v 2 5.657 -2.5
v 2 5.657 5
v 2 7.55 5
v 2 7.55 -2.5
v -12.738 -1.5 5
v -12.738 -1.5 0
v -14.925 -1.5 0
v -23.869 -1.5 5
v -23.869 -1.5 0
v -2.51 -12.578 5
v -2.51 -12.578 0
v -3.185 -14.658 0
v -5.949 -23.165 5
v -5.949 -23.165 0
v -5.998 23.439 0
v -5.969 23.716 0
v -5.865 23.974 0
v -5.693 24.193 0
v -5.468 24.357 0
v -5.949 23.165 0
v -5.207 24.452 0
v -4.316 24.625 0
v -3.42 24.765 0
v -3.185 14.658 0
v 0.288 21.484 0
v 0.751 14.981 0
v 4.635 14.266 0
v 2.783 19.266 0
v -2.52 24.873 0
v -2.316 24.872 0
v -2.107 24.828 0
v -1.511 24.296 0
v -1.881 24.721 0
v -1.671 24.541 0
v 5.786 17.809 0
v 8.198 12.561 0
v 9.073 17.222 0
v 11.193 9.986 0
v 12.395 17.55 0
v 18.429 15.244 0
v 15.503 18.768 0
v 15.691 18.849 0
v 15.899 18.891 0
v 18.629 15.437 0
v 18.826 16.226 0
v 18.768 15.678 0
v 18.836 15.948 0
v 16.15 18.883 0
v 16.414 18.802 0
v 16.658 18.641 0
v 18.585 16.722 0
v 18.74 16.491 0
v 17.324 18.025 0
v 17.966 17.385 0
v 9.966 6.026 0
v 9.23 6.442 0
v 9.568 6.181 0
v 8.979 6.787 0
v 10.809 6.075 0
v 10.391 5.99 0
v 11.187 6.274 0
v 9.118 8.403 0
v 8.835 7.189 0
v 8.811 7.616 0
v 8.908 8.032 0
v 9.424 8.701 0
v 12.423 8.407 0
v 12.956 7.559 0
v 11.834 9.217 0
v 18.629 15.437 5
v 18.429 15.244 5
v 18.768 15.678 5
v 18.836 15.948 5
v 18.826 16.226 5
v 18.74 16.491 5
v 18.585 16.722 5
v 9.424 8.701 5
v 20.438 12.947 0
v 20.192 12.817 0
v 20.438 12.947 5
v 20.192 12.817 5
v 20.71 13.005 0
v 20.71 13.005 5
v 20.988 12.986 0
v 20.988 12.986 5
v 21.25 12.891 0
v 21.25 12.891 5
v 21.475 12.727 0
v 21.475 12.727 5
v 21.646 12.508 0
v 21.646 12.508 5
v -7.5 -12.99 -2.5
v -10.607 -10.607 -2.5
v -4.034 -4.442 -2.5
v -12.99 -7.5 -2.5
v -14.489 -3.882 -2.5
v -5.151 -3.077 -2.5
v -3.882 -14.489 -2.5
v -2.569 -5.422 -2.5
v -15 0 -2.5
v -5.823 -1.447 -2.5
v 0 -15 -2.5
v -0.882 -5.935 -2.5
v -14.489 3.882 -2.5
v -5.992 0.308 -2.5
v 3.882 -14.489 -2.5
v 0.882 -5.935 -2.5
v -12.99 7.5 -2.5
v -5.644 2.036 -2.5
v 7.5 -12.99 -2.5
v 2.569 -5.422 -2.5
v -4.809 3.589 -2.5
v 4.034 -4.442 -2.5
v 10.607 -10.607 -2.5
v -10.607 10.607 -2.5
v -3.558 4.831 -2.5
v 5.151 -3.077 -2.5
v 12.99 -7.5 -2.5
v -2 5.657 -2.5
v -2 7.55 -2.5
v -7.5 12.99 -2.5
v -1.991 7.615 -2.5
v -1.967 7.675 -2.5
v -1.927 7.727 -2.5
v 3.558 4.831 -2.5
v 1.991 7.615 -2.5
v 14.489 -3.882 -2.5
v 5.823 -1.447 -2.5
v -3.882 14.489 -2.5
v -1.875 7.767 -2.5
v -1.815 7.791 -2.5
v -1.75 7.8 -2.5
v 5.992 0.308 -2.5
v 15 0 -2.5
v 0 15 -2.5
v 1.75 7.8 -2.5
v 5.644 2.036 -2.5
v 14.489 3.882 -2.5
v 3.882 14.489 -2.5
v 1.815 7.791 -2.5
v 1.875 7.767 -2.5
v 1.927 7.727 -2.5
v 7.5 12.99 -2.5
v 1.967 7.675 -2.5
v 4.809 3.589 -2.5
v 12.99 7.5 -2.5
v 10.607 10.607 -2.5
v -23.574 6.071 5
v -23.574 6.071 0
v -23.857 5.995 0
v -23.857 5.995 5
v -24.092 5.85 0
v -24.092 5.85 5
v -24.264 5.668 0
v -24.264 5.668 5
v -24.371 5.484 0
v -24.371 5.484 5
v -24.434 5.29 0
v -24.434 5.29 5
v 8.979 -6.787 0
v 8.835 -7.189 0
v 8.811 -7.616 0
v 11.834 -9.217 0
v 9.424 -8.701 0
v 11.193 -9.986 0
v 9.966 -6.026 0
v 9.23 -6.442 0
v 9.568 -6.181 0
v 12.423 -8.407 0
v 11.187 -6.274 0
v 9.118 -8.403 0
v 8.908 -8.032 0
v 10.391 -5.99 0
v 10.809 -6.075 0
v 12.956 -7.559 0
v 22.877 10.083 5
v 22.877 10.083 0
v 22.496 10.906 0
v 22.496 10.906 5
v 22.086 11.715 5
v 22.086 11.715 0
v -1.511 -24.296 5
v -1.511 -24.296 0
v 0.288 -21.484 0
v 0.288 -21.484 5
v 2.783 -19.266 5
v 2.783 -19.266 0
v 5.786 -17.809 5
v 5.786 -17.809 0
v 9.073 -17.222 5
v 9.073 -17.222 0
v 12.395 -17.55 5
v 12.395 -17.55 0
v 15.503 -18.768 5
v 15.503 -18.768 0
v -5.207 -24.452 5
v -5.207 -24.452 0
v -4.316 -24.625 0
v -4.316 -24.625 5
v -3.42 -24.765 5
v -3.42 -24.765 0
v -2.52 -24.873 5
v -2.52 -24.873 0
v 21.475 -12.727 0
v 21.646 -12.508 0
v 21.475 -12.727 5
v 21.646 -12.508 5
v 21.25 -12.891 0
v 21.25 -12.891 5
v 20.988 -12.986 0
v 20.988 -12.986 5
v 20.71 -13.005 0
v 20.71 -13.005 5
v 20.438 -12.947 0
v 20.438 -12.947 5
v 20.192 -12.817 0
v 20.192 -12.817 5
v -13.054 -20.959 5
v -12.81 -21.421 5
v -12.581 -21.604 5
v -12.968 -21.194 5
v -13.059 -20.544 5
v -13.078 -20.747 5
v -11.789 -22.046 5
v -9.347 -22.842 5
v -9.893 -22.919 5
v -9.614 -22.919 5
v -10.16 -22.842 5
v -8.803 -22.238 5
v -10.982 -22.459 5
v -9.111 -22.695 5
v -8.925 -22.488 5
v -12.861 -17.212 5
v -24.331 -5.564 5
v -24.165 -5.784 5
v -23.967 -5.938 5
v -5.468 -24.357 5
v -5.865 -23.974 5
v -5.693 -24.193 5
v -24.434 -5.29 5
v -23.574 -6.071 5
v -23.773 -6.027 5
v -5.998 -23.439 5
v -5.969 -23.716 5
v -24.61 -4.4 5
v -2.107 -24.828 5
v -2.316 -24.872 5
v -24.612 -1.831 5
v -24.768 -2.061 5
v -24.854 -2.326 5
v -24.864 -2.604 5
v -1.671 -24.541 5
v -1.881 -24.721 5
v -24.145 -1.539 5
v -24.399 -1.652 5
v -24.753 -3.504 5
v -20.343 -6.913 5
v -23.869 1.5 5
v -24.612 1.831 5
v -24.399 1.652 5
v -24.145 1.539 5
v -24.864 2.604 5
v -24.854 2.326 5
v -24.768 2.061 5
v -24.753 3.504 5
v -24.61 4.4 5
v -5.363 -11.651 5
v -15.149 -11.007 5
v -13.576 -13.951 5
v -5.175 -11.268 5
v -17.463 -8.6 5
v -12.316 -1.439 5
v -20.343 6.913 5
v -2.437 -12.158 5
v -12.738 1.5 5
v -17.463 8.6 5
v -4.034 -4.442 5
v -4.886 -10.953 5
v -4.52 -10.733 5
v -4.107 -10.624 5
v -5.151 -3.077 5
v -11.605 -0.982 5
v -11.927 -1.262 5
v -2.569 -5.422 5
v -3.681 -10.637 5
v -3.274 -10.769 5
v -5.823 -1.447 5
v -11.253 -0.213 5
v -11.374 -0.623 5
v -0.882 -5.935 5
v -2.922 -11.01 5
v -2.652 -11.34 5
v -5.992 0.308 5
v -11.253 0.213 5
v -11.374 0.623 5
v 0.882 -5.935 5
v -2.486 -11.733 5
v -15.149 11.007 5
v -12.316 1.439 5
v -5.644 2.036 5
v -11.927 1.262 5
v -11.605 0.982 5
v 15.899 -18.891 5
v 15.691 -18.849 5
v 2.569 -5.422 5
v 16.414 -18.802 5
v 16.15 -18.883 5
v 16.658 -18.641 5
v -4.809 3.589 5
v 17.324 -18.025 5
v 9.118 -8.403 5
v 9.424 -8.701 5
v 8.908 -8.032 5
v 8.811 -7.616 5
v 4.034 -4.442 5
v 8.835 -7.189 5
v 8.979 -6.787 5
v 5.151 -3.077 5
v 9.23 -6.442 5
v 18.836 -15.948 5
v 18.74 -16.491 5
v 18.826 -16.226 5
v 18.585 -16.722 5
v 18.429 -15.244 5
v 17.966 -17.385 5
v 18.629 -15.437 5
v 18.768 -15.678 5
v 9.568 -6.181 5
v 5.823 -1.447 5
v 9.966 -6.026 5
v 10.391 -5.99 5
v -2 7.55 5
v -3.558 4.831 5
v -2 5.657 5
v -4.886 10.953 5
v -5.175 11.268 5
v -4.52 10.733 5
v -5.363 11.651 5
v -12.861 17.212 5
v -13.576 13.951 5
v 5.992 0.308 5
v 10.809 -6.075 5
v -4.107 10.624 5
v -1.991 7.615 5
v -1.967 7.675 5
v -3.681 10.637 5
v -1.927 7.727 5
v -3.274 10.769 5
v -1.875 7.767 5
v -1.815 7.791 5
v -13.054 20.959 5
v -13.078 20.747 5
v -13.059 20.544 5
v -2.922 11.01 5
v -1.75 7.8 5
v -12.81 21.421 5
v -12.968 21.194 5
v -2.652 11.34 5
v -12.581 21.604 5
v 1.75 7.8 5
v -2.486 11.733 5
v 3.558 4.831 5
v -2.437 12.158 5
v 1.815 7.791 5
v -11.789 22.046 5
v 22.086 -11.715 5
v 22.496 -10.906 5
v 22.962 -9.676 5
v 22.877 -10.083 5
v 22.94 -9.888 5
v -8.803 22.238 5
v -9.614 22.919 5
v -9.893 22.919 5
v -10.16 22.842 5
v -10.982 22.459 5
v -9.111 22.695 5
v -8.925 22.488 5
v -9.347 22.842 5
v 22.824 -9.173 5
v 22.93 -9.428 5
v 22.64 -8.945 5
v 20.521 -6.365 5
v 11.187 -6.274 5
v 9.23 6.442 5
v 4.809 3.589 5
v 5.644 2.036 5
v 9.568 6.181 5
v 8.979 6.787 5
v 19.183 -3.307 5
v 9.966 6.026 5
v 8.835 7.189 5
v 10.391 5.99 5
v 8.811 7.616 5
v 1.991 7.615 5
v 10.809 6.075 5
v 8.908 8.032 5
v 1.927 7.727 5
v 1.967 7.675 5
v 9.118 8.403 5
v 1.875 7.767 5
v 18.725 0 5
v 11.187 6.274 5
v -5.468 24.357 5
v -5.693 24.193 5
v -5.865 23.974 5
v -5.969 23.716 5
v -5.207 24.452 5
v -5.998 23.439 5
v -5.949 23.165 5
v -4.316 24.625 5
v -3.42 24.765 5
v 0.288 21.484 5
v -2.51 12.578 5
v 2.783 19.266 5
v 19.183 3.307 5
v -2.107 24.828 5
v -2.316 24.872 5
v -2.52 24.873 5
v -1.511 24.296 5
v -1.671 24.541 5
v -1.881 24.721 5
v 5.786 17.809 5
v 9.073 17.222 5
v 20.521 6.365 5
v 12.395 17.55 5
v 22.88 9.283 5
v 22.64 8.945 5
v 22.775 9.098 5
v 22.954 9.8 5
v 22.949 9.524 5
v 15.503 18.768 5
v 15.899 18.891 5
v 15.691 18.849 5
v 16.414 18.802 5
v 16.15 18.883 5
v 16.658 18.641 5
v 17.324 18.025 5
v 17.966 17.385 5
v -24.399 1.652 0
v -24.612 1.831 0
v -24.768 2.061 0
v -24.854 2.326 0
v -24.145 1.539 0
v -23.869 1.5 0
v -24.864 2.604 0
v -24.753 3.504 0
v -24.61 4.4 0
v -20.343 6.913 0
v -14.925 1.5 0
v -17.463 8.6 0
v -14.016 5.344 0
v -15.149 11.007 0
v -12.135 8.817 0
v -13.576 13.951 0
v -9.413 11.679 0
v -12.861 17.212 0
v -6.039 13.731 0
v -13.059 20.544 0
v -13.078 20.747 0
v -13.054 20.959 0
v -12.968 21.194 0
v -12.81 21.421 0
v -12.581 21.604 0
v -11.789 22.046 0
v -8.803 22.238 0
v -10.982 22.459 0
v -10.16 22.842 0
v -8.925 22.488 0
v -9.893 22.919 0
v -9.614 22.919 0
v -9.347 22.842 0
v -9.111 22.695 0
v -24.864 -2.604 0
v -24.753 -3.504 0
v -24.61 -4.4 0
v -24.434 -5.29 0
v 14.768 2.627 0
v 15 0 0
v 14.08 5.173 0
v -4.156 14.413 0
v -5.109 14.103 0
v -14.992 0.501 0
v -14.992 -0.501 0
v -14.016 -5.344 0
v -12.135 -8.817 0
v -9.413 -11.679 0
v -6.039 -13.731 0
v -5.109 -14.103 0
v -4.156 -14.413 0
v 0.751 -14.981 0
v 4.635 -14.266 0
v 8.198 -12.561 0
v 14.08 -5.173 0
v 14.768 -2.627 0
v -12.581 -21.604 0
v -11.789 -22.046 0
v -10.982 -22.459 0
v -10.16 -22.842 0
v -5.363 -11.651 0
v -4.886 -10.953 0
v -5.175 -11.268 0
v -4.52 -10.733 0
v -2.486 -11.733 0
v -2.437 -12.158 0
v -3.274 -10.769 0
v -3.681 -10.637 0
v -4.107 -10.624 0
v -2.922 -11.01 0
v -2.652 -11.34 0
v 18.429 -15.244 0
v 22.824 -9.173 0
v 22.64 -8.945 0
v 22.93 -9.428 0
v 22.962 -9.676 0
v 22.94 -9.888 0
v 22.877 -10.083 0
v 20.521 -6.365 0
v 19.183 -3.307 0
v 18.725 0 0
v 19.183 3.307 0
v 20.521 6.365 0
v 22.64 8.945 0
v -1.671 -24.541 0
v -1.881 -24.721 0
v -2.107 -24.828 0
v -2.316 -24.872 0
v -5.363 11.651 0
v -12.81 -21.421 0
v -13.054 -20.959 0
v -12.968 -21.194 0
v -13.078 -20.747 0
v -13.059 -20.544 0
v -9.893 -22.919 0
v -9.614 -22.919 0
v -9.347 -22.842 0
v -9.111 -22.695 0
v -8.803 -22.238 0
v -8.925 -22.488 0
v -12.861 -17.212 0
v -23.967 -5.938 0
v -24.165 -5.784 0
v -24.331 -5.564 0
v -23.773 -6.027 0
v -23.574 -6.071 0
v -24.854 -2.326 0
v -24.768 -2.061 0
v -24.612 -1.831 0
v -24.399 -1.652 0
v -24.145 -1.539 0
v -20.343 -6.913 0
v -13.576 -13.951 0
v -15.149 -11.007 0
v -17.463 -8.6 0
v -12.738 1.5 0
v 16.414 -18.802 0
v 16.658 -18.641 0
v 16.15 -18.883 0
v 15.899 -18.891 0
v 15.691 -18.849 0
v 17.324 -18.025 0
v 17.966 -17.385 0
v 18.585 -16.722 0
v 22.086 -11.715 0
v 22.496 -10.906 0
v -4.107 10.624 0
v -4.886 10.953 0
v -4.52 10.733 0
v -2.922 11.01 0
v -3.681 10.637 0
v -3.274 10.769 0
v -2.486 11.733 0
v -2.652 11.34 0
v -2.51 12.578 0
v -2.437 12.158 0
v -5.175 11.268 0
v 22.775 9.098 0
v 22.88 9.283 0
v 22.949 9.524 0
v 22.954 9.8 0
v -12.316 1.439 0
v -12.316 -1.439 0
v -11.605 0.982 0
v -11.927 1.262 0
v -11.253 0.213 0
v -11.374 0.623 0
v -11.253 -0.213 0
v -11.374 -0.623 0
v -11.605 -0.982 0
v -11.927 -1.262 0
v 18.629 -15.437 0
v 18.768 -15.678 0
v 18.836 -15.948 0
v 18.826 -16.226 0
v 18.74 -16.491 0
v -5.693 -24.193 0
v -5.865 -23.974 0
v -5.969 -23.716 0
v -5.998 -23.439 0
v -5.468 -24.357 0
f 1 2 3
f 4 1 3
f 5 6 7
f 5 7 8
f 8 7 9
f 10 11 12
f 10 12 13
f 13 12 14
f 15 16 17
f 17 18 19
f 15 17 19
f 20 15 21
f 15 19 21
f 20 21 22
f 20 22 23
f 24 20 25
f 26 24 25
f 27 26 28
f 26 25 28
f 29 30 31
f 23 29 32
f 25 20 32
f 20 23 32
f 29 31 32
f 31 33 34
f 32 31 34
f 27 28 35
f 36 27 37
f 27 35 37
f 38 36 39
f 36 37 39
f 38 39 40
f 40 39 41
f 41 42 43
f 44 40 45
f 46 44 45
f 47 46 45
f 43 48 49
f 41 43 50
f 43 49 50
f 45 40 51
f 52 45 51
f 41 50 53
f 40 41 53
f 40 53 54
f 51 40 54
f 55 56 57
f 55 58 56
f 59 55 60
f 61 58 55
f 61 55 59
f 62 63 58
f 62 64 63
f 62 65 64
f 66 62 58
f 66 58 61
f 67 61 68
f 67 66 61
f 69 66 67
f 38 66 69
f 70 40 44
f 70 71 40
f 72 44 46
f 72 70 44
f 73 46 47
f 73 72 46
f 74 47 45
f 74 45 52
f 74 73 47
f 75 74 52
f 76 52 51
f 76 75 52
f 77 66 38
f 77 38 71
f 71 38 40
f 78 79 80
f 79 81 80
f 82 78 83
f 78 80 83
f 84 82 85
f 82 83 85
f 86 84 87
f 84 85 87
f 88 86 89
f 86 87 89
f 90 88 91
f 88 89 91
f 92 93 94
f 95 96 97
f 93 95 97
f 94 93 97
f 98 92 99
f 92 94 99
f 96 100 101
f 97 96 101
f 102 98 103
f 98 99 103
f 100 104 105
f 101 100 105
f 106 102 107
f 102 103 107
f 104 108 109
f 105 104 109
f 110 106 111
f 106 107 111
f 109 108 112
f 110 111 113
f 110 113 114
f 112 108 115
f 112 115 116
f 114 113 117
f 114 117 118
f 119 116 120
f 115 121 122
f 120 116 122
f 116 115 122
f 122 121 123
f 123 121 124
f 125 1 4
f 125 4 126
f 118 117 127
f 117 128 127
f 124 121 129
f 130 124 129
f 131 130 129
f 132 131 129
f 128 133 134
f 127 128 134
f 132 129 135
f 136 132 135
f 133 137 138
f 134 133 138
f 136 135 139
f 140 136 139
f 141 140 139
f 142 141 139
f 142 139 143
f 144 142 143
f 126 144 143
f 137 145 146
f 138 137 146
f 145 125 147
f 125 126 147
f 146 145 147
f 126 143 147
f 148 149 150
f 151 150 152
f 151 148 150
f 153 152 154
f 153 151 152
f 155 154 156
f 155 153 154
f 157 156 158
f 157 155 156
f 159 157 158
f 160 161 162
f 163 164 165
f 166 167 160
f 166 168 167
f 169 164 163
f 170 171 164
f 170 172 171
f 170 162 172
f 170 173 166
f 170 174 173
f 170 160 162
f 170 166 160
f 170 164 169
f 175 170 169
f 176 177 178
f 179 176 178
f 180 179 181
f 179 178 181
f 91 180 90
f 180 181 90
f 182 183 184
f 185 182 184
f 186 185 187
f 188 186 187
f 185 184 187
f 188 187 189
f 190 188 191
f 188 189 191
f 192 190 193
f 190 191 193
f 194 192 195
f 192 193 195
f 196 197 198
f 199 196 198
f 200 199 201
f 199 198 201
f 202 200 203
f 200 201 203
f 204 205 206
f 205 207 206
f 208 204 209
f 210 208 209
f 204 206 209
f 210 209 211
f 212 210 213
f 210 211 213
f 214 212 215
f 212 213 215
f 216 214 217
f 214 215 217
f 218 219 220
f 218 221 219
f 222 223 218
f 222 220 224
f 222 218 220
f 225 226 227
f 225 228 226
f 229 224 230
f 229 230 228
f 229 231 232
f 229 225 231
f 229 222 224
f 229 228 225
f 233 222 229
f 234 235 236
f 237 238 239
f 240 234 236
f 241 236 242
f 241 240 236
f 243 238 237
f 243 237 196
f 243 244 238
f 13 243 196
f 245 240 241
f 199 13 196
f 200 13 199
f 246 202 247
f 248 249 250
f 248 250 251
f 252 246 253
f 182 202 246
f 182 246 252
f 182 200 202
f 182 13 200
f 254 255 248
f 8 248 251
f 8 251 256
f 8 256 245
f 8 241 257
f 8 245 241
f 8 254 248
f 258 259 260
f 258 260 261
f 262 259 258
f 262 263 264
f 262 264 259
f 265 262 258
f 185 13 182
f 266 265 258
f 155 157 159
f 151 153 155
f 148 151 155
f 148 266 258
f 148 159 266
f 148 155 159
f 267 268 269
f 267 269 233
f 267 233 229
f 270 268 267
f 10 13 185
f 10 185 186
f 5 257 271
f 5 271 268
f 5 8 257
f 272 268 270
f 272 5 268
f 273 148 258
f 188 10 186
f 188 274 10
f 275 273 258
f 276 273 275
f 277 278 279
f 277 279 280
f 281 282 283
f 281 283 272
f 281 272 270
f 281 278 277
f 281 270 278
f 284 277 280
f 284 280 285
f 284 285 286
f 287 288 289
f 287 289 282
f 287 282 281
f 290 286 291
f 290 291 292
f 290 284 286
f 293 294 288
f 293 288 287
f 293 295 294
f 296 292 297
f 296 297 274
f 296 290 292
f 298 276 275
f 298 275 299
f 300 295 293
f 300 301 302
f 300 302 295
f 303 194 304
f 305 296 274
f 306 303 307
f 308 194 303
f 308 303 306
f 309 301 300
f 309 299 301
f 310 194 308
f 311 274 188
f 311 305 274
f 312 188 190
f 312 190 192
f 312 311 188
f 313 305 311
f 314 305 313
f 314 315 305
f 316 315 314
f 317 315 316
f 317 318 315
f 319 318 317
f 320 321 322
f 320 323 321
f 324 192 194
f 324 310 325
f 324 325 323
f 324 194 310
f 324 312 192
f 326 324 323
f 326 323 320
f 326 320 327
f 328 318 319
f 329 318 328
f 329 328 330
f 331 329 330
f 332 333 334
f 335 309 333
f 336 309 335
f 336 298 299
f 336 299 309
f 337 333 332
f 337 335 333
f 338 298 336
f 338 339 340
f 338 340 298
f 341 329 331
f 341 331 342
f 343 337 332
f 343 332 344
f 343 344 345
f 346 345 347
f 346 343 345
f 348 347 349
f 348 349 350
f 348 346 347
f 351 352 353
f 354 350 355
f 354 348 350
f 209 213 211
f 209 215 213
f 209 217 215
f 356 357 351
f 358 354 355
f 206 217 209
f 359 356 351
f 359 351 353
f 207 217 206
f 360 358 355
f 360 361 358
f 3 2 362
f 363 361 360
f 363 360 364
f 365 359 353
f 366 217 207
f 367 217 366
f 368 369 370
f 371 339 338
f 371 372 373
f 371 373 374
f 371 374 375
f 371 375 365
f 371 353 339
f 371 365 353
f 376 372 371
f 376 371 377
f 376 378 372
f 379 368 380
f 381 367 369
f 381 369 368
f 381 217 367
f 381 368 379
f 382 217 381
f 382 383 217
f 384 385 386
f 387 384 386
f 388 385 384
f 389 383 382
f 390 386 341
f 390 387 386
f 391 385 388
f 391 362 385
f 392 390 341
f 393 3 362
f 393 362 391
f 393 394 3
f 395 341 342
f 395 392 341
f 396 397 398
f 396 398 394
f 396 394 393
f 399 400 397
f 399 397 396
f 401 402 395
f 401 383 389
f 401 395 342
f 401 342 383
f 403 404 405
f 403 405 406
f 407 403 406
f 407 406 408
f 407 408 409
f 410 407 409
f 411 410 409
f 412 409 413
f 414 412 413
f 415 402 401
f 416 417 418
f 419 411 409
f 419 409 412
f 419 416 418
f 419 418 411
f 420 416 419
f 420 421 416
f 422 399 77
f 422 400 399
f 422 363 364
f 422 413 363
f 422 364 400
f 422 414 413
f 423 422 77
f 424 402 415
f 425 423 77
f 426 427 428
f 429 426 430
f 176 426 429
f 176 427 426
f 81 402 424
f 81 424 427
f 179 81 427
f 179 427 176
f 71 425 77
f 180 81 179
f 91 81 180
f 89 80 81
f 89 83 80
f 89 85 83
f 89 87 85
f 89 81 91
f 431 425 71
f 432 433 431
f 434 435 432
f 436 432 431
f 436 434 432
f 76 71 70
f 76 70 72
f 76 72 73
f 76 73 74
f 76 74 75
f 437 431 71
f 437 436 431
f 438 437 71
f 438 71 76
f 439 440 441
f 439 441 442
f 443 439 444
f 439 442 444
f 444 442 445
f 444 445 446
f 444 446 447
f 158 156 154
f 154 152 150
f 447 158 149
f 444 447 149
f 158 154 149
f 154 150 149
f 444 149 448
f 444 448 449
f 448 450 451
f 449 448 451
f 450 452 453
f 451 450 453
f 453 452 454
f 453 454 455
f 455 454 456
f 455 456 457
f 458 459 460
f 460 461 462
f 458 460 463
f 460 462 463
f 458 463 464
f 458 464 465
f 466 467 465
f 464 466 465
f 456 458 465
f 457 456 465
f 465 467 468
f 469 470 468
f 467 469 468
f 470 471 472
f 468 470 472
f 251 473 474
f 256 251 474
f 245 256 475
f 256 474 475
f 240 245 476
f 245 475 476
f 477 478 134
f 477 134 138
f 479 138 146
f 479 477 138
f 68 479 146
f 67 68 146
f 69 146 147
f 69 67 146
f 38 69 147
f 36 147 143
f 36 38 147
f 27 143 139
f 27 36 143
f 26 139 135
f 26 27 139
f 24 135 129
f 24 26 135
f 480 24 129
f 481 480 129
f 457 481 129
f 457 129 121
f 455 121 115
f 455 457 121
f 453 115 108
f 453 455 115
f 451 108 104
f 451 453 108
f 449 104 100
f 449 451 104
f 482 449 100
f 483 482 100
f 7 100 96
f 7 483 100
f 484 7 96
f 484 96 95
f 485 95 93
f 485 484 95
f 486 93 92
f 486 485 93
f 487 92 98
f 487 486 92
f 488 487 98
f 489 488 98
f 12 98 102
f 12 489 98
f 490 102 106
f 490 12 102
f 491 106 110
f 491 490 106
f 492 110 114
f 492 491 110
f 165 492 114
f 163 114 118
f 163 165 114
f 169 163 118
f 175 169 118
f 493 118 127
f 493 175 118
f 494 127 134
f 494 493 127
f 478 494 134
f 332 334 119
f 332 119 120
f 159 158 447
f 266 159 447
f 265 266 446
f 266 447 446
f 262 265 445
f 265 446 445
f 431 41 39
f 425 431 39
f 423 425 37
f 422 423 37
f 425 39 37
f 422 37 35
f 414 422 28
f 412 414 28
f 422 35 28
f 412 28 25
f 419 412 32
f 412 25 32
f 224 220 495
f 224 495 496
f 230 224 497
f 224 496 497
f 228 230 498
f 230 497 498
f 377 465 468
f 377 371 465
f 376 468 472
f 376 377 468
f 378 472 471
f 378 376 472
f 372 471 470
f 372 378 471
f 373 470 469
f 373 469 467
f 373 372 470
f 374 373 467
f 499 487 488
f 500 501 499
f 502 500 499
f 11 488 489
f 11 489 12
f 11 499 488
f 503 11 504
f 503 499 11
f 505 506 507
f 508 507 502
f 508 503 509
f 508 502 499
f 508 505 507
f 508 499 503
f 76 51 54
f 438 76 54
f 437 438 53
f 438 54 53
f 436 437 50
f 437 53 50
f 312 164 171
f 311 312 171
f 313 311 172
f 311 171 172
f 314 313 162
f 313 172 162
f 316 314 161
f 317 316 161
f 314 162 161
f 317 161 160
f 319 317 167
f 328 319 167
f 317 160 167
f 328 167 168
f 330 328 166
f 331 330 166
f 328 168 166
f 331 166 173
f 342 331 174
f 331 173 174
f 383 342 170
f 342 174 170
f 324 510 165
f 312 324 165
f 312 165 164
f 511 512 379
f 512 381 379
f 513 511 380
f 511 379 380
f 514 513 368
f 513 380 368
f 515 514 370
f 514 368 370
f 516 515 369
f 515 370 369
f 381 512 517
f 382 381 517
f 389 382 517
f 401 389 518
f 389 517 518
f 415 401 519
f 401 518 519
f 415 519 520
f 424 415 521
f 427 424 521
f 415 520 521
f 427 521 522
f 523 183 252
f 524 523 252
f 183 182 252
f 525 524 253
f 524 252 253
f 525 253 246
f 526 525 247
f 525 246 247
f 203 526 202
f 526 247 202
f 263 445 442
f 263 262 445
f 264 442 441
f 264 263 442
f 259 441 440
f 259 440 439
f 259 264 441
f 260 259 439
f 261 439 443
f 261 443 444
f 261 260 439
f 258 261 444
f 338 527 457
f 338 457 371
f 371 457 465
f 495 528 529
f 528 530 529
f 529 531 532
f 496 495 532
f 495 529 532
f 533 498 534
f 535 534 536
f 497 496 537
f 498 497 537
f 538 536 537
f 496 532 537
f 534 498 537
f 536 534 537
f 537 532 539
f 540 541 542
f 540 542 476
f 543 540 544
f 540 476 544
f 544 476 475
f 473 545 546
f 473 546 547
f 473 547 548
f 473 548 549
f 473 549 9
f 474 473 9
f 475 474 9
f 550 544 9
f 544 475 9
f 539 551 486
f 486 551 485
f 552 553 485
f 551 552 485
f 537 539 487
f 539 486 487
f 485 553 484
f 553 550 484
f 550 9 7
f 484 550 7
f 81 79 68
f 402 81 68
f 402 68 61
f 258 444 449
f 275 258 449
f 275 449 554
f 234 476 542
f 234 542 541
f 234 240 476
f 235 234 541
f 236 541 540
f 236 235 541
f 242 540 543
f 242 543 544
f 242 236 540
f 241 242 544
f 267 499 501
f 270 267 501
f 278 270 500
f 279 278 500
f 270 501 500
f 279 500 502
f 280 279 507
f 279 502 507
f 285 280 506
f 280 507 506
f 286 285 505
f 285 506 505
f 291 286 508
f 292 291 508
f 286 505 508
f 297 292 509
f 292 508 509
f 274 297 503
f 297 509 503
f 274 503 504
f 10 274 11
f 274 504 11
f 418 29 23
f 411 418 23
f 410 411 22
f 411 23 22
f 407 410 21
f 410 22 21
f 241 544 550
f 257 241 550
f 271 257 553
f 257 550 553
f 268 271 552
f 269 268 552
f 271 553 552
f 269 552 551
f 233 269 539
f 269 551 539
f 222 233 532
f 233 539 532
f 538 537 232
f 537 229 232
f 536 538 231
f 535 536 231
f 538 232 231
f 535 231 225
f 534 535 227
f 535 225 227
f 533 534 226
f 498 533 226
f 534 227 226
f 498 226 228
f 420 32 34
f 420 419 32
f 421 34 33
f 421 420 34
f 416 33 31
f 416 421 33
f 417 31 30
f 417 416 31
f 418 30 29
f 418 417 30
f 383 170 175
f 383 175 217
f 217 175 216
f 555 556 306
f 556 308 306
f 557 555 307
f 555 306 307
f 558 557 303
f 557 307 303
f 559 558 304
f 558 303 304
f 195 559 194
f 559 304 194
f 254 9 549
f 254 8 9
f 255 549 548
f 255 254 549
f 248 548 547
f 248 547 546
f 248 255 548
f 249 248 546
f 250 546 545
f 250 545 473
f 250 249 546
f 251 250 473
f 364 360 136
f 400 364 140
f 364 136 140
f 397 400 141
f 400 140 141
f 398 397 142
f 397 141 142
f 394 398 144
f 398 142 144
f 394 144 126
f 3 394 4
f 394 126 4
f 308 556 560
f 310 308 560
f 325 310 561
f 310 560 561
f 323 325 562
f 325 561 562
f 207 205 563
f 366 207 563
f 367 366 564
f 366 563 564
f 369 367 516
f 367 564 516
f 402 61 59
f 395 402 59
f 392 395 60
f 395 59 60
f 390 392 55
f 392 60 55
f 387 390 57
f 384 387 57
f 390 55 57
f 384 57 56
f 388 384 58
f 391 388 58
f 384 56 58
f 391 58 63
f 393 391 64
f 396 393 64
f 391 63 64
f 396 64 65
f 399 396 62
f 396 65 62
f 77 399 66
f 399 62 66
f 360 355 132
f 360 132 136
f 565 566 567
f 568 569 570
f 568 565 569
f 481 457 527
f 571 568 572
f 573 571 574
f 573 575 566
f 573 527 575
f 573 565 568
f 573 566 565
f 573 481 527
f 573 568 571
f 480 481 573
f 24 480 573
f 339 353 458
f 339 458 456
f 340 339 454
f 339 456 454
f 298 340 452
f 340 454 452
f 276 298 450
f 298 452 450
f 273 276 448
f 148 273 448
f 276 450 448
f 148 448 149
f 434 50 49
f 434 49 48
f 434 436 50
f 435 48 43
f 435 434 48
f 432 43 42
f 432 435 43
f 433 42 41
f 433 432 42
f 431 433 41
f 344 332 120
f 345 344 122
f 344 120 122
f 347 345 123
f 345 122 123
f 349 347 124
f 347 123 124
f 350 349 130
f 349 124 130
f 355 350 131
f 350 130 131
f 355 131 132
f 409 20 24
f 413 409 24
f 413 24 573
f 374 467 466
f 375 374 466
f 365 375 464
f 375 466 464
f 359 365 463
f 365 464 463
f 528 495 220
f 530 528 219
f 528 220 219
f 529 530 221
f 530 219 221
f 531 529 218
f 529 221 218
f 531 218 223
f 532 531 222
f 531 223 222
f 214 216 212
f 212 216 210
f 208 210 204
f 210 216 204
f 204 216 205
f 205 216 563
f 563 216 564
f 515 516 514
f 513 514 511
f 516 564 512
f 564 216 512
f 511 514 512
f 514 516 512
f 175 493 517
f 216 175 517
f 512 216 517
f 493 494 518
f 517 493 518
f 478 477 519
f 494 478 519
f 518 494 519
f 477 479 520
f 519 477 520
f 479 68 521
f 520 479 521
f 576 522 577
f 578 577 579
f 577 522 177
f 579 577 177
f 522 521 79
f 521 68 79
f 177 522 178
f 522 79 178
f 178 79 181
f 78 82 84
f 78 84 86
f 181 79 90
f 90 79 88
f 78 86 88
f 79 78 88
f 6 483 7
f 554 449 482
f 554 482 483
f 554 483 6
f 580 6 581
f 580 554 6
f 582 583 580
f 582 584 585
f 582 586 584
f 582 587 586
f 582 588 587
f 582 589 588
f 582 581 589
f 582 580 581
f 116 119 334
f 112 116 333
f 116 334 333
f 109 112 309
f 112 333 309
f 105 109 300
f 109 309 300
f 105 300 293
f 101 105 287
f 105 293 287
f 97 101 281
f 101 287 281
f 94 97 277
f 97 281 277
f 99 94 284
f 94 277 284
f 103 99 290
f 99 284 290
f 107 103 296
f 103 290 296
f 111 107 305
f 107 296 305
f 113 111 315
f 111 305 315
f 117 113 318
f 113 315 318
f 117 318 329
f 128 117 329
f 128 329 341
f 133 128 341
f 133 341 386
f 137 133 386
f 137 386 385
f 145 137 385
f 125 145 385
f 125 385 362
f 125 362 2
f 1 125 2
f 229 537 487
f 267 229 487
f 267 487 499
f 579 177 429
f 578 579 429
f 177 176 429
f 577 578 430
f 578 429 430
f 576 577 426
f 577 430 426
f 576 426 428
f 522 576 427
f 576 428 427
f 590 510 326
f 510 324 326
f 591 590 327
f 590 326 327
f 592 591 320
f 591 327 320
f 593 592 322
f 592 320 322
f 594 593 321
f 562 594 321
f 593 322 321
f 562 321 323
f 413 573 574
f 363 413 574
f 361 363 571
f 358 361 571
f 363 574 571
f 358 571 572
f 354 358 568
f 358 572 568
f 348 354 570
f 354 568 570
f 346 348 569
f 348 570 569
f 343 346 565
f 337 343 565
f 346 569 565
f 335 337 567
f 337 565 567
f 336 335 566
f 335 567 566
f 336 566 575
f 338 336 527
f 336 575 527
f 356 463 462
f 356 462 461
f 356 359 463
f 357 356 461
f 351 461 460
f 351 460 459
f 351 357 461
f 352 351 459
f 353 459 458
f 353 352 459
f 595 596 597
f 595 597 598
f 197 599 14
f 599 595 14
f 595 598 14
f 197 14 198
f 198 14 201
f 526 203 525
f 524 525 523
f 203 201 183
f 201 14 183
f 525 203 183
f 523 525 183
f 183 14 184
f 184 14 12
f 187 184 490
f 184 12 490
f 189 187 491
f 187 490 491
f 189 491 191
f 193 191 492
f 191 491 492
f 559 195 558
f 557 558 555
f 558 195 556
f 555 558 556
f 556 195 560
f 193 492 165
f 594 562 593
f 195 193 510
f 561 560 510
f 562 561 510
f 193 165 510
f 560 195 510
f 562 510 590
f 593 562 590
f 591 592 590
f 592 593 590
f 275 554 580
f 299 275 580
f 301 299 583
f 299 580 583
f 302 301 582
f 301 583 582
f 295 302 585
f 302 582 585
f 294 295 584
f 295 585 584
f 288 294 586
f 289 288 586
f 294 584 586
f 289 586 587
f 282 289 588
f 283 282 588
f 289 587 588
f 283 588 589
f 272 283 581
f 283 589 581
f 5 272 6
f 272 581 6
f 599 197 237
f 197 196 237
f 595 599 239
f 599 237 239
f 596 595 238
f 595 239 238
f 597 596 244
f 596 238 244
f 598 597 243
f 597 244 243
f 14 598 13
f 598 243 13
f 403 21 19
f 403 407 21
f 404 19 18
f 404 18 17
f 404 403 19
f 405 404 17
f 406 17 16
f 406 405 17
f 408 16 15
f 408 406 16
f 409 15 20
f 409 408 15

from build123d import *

# Parameters (mm, degrees)
BOSS_EXTRUDE1_DEPTH     = 5
SKETCH2_R               = 15
BOSS_EXTRUDE2_DEPTH     = 2.5
SKETCH3_R               = 6
SKETCH3_W               = 4
SKETCH3_H               = 3.6
CUT_EXTRUDE1_DEPTH      = 6
CUT_EXTRUDE1_DEPTH_BACK = 3.5
FILLET2_R               = 0.25
FILLET1_R               = 1


with BuildPart() as part:
    # Sketch1 → Boss-Extrude1 (new body)
    with BuildSketch(Plane.XY):
        with BuildLine():
            ThreePointArc((11.187046571, 6.27376313), (9.091843201, 6.605610744), (9.423690814, 8.700814114))
            Line((9.423690814, 8.700814114), (19.307308392, 15.881682614))
            ThreePointArc((19.307308392, 15.881682614), (17.777891388, 17.576876224), (16.100198302, 19.125470312))
            ThreePointArc((16.100198302, 19.125470312), (5.786474508, 17.808937333), (-1.783664646, 24.936289628))
            ThreePointArc((-1.783664646, 24.936289628), (-4.051187632, 24.669573948), (-6.284921782, 24.197102268))
            Line((-6.284921782, 24.197102268), (-2.5097158, 12.578212966))
            ThreePointArc((-2.5097158, 12.578212966), (-3.472775082, 10.6881027), (-5.362885348, 11.651161982))
            Line((-5.362885348, 11.651161982), (-9.138091331, 23.270051285))
            ThreePointArc((-9.138091331, 23.270051285), (-11.222932105, 22.339332912), (-13.214168279, 21.22229386))
            ThreePointArc((-13.214168279, 21.22229386), (-15.149186938, 11.006528575), (-24.267003431, 6.009371387))
            ThreePointArc((-24.267003431, 6.009371387), (-24.714044883, 3.770409198), (-24.954959427, 1.5))
            Line((-24.954959427, 1.5), (-12.738136237, 1.5))
            ThreePointArc((-12.738136237, 1.5), (-11.238136237, 0), (-12.738136237, -1.5))
            Line((-12.738136237, -1.5), (-24.954959427, -1.5))
            ThreePointArc((-24.954959427, -1.5), (-24.714044883, -3.770409198), (-24.267003431, -6.009371387))
            ThreePointArc((-24.267003431, -6.009371387), (-15.149186938, -11.006528575), (-13.214168279, -21.22229386))
            ThreePointArc((-13.214168279, -21.22229386), (-11.222932105, -22.339332912), (-9.138091331, -23.270051285))
            Line((-9.138091331, -23.270051285), (-5.362885348, -11.651161982))
            ThreePointArc((-5.362885348, -11.651161982), (-3.472775082, -10.6881027), (-2.5097158, -12.578212966))
            Line((-2.5097158, -12.578212966), (-6.284921782, -24.197102268))
            ThreePointArc((-6.284921782, -24.197102268), (-4.051187632, -24.669573948), (-1.783664646, -24.936289628))
            ThreePointArc((-1.783664646, -24.936289628), (5.786474508, -17.808937333), (16.100198302, -19.125470312))
            ThreePointArc((16.100198302, -19.125470312), (17.777891388, -17.576876224), (19.307308392, -15.881682614))
            Line((19.307308392, -15.881682614), (9.423690814, -8.700814114))
            ThreePointArc((9.423690814, -8.700814114), (9.091843201, -6.605610744), (11.187046571, -6.27376313))
            Line((11.187046571, -6.27376313), (21.070664149, -13.454631631))
            ThreePointArc((21.070664149, -13.454631631), (22.210273232, -11.47622599), (23.164638055, -9.402103157))
            ThreePointArc((23.164638055, -9.402103157), (18.725424859, 0), (23.164638055, 9.402103157))
            ThreePointArc((23.164638055, 9.402103157), (22.210273232, 11.47622599), (21.070664149, 13.454631631))
            Line((21.070664149, 13.454631631), (11.187046571, 6.27376313))
        make_face()
    extrude(amount=BOSS_EXTRUDE1_DEPTH)

    # Sketch2 → Boss-Extrude2 (add)
    with BuildSketch(Plane.XY):
        Circle(SKETCH2_R)
    extrude(amount=-BOSS_EXTRUDE2_DEPTH)

    # Sketch3 → Cut-Extrude1 (cut, two sides)
    with BuildSketch(Plane.XY) as cut_extrude1_sk:
        Circle(SKETCH3_R)
        with Locations((0, 6)):
            Rectangle(SKETCH3_W, SKETCH3_H)
    extrude(amount=CUT_EXTRUDE1_DEPTH, mode=Mode.SUBTRACT)
    extrude(cut_extrude1_sk.sketch, amount=-CUT_EXTRUDE1_DEPTH_BACK, mode=Mode.SUBTRACT)

    # Fillet2
    fillet2_edges = [part.edges().sort_by_distance(p)[0] for p in [
        (-2, 7.8, 1.25),
        (2, 7.8, 1.25),
    ]]
    fillet(fillet2_edges, radius=FILLET2_R)

    # Fillet1
    fillet1_edges = [part.edges().sort_by_distance(p)[0] for p in [
        (-6.284921782, 24.197102268, 2.5),
        (-1.783664646, 24.936289628, 2.5),
        (16.100198302, 19.125470312, 2.5),
        (19.307308392, 15.881682614, 2.5),
        (21.070664149, 13.454631631, 2.5),
        (23.164638055, 9.402103157, 2.5),
        (23.164638055, -9.402103157, 2.5),
        (21.070664149, -13.454631631, 2.5),
        (19.307308392, -15.881682614, 2.5),
        (16.100198302, -19.125470312, 2.5),
        (-1.783664646, -24.936289628, 2.5),
        (-6.284921782, -24.197102268, 2.5),
        (-9.138091331, -23.270051285, 2.5),
        (-13.214168279, -21.22229386, 2.5),
        (-24.267003431, -6.009371387, 2.5),
        (-24.954959427, -1.5, 2.5),
        (-24.954959427, 1.5, 2.5),
        (-24.267003431, 6.009371387, 2.5),
        (-13.214168279, 21.22229386, 2.5),
        (-9.138091331, 23.270051285, 2.5),
    ]]
    fillet(fillet1_edges, radius=FILLET1_R)


solid = part.part
